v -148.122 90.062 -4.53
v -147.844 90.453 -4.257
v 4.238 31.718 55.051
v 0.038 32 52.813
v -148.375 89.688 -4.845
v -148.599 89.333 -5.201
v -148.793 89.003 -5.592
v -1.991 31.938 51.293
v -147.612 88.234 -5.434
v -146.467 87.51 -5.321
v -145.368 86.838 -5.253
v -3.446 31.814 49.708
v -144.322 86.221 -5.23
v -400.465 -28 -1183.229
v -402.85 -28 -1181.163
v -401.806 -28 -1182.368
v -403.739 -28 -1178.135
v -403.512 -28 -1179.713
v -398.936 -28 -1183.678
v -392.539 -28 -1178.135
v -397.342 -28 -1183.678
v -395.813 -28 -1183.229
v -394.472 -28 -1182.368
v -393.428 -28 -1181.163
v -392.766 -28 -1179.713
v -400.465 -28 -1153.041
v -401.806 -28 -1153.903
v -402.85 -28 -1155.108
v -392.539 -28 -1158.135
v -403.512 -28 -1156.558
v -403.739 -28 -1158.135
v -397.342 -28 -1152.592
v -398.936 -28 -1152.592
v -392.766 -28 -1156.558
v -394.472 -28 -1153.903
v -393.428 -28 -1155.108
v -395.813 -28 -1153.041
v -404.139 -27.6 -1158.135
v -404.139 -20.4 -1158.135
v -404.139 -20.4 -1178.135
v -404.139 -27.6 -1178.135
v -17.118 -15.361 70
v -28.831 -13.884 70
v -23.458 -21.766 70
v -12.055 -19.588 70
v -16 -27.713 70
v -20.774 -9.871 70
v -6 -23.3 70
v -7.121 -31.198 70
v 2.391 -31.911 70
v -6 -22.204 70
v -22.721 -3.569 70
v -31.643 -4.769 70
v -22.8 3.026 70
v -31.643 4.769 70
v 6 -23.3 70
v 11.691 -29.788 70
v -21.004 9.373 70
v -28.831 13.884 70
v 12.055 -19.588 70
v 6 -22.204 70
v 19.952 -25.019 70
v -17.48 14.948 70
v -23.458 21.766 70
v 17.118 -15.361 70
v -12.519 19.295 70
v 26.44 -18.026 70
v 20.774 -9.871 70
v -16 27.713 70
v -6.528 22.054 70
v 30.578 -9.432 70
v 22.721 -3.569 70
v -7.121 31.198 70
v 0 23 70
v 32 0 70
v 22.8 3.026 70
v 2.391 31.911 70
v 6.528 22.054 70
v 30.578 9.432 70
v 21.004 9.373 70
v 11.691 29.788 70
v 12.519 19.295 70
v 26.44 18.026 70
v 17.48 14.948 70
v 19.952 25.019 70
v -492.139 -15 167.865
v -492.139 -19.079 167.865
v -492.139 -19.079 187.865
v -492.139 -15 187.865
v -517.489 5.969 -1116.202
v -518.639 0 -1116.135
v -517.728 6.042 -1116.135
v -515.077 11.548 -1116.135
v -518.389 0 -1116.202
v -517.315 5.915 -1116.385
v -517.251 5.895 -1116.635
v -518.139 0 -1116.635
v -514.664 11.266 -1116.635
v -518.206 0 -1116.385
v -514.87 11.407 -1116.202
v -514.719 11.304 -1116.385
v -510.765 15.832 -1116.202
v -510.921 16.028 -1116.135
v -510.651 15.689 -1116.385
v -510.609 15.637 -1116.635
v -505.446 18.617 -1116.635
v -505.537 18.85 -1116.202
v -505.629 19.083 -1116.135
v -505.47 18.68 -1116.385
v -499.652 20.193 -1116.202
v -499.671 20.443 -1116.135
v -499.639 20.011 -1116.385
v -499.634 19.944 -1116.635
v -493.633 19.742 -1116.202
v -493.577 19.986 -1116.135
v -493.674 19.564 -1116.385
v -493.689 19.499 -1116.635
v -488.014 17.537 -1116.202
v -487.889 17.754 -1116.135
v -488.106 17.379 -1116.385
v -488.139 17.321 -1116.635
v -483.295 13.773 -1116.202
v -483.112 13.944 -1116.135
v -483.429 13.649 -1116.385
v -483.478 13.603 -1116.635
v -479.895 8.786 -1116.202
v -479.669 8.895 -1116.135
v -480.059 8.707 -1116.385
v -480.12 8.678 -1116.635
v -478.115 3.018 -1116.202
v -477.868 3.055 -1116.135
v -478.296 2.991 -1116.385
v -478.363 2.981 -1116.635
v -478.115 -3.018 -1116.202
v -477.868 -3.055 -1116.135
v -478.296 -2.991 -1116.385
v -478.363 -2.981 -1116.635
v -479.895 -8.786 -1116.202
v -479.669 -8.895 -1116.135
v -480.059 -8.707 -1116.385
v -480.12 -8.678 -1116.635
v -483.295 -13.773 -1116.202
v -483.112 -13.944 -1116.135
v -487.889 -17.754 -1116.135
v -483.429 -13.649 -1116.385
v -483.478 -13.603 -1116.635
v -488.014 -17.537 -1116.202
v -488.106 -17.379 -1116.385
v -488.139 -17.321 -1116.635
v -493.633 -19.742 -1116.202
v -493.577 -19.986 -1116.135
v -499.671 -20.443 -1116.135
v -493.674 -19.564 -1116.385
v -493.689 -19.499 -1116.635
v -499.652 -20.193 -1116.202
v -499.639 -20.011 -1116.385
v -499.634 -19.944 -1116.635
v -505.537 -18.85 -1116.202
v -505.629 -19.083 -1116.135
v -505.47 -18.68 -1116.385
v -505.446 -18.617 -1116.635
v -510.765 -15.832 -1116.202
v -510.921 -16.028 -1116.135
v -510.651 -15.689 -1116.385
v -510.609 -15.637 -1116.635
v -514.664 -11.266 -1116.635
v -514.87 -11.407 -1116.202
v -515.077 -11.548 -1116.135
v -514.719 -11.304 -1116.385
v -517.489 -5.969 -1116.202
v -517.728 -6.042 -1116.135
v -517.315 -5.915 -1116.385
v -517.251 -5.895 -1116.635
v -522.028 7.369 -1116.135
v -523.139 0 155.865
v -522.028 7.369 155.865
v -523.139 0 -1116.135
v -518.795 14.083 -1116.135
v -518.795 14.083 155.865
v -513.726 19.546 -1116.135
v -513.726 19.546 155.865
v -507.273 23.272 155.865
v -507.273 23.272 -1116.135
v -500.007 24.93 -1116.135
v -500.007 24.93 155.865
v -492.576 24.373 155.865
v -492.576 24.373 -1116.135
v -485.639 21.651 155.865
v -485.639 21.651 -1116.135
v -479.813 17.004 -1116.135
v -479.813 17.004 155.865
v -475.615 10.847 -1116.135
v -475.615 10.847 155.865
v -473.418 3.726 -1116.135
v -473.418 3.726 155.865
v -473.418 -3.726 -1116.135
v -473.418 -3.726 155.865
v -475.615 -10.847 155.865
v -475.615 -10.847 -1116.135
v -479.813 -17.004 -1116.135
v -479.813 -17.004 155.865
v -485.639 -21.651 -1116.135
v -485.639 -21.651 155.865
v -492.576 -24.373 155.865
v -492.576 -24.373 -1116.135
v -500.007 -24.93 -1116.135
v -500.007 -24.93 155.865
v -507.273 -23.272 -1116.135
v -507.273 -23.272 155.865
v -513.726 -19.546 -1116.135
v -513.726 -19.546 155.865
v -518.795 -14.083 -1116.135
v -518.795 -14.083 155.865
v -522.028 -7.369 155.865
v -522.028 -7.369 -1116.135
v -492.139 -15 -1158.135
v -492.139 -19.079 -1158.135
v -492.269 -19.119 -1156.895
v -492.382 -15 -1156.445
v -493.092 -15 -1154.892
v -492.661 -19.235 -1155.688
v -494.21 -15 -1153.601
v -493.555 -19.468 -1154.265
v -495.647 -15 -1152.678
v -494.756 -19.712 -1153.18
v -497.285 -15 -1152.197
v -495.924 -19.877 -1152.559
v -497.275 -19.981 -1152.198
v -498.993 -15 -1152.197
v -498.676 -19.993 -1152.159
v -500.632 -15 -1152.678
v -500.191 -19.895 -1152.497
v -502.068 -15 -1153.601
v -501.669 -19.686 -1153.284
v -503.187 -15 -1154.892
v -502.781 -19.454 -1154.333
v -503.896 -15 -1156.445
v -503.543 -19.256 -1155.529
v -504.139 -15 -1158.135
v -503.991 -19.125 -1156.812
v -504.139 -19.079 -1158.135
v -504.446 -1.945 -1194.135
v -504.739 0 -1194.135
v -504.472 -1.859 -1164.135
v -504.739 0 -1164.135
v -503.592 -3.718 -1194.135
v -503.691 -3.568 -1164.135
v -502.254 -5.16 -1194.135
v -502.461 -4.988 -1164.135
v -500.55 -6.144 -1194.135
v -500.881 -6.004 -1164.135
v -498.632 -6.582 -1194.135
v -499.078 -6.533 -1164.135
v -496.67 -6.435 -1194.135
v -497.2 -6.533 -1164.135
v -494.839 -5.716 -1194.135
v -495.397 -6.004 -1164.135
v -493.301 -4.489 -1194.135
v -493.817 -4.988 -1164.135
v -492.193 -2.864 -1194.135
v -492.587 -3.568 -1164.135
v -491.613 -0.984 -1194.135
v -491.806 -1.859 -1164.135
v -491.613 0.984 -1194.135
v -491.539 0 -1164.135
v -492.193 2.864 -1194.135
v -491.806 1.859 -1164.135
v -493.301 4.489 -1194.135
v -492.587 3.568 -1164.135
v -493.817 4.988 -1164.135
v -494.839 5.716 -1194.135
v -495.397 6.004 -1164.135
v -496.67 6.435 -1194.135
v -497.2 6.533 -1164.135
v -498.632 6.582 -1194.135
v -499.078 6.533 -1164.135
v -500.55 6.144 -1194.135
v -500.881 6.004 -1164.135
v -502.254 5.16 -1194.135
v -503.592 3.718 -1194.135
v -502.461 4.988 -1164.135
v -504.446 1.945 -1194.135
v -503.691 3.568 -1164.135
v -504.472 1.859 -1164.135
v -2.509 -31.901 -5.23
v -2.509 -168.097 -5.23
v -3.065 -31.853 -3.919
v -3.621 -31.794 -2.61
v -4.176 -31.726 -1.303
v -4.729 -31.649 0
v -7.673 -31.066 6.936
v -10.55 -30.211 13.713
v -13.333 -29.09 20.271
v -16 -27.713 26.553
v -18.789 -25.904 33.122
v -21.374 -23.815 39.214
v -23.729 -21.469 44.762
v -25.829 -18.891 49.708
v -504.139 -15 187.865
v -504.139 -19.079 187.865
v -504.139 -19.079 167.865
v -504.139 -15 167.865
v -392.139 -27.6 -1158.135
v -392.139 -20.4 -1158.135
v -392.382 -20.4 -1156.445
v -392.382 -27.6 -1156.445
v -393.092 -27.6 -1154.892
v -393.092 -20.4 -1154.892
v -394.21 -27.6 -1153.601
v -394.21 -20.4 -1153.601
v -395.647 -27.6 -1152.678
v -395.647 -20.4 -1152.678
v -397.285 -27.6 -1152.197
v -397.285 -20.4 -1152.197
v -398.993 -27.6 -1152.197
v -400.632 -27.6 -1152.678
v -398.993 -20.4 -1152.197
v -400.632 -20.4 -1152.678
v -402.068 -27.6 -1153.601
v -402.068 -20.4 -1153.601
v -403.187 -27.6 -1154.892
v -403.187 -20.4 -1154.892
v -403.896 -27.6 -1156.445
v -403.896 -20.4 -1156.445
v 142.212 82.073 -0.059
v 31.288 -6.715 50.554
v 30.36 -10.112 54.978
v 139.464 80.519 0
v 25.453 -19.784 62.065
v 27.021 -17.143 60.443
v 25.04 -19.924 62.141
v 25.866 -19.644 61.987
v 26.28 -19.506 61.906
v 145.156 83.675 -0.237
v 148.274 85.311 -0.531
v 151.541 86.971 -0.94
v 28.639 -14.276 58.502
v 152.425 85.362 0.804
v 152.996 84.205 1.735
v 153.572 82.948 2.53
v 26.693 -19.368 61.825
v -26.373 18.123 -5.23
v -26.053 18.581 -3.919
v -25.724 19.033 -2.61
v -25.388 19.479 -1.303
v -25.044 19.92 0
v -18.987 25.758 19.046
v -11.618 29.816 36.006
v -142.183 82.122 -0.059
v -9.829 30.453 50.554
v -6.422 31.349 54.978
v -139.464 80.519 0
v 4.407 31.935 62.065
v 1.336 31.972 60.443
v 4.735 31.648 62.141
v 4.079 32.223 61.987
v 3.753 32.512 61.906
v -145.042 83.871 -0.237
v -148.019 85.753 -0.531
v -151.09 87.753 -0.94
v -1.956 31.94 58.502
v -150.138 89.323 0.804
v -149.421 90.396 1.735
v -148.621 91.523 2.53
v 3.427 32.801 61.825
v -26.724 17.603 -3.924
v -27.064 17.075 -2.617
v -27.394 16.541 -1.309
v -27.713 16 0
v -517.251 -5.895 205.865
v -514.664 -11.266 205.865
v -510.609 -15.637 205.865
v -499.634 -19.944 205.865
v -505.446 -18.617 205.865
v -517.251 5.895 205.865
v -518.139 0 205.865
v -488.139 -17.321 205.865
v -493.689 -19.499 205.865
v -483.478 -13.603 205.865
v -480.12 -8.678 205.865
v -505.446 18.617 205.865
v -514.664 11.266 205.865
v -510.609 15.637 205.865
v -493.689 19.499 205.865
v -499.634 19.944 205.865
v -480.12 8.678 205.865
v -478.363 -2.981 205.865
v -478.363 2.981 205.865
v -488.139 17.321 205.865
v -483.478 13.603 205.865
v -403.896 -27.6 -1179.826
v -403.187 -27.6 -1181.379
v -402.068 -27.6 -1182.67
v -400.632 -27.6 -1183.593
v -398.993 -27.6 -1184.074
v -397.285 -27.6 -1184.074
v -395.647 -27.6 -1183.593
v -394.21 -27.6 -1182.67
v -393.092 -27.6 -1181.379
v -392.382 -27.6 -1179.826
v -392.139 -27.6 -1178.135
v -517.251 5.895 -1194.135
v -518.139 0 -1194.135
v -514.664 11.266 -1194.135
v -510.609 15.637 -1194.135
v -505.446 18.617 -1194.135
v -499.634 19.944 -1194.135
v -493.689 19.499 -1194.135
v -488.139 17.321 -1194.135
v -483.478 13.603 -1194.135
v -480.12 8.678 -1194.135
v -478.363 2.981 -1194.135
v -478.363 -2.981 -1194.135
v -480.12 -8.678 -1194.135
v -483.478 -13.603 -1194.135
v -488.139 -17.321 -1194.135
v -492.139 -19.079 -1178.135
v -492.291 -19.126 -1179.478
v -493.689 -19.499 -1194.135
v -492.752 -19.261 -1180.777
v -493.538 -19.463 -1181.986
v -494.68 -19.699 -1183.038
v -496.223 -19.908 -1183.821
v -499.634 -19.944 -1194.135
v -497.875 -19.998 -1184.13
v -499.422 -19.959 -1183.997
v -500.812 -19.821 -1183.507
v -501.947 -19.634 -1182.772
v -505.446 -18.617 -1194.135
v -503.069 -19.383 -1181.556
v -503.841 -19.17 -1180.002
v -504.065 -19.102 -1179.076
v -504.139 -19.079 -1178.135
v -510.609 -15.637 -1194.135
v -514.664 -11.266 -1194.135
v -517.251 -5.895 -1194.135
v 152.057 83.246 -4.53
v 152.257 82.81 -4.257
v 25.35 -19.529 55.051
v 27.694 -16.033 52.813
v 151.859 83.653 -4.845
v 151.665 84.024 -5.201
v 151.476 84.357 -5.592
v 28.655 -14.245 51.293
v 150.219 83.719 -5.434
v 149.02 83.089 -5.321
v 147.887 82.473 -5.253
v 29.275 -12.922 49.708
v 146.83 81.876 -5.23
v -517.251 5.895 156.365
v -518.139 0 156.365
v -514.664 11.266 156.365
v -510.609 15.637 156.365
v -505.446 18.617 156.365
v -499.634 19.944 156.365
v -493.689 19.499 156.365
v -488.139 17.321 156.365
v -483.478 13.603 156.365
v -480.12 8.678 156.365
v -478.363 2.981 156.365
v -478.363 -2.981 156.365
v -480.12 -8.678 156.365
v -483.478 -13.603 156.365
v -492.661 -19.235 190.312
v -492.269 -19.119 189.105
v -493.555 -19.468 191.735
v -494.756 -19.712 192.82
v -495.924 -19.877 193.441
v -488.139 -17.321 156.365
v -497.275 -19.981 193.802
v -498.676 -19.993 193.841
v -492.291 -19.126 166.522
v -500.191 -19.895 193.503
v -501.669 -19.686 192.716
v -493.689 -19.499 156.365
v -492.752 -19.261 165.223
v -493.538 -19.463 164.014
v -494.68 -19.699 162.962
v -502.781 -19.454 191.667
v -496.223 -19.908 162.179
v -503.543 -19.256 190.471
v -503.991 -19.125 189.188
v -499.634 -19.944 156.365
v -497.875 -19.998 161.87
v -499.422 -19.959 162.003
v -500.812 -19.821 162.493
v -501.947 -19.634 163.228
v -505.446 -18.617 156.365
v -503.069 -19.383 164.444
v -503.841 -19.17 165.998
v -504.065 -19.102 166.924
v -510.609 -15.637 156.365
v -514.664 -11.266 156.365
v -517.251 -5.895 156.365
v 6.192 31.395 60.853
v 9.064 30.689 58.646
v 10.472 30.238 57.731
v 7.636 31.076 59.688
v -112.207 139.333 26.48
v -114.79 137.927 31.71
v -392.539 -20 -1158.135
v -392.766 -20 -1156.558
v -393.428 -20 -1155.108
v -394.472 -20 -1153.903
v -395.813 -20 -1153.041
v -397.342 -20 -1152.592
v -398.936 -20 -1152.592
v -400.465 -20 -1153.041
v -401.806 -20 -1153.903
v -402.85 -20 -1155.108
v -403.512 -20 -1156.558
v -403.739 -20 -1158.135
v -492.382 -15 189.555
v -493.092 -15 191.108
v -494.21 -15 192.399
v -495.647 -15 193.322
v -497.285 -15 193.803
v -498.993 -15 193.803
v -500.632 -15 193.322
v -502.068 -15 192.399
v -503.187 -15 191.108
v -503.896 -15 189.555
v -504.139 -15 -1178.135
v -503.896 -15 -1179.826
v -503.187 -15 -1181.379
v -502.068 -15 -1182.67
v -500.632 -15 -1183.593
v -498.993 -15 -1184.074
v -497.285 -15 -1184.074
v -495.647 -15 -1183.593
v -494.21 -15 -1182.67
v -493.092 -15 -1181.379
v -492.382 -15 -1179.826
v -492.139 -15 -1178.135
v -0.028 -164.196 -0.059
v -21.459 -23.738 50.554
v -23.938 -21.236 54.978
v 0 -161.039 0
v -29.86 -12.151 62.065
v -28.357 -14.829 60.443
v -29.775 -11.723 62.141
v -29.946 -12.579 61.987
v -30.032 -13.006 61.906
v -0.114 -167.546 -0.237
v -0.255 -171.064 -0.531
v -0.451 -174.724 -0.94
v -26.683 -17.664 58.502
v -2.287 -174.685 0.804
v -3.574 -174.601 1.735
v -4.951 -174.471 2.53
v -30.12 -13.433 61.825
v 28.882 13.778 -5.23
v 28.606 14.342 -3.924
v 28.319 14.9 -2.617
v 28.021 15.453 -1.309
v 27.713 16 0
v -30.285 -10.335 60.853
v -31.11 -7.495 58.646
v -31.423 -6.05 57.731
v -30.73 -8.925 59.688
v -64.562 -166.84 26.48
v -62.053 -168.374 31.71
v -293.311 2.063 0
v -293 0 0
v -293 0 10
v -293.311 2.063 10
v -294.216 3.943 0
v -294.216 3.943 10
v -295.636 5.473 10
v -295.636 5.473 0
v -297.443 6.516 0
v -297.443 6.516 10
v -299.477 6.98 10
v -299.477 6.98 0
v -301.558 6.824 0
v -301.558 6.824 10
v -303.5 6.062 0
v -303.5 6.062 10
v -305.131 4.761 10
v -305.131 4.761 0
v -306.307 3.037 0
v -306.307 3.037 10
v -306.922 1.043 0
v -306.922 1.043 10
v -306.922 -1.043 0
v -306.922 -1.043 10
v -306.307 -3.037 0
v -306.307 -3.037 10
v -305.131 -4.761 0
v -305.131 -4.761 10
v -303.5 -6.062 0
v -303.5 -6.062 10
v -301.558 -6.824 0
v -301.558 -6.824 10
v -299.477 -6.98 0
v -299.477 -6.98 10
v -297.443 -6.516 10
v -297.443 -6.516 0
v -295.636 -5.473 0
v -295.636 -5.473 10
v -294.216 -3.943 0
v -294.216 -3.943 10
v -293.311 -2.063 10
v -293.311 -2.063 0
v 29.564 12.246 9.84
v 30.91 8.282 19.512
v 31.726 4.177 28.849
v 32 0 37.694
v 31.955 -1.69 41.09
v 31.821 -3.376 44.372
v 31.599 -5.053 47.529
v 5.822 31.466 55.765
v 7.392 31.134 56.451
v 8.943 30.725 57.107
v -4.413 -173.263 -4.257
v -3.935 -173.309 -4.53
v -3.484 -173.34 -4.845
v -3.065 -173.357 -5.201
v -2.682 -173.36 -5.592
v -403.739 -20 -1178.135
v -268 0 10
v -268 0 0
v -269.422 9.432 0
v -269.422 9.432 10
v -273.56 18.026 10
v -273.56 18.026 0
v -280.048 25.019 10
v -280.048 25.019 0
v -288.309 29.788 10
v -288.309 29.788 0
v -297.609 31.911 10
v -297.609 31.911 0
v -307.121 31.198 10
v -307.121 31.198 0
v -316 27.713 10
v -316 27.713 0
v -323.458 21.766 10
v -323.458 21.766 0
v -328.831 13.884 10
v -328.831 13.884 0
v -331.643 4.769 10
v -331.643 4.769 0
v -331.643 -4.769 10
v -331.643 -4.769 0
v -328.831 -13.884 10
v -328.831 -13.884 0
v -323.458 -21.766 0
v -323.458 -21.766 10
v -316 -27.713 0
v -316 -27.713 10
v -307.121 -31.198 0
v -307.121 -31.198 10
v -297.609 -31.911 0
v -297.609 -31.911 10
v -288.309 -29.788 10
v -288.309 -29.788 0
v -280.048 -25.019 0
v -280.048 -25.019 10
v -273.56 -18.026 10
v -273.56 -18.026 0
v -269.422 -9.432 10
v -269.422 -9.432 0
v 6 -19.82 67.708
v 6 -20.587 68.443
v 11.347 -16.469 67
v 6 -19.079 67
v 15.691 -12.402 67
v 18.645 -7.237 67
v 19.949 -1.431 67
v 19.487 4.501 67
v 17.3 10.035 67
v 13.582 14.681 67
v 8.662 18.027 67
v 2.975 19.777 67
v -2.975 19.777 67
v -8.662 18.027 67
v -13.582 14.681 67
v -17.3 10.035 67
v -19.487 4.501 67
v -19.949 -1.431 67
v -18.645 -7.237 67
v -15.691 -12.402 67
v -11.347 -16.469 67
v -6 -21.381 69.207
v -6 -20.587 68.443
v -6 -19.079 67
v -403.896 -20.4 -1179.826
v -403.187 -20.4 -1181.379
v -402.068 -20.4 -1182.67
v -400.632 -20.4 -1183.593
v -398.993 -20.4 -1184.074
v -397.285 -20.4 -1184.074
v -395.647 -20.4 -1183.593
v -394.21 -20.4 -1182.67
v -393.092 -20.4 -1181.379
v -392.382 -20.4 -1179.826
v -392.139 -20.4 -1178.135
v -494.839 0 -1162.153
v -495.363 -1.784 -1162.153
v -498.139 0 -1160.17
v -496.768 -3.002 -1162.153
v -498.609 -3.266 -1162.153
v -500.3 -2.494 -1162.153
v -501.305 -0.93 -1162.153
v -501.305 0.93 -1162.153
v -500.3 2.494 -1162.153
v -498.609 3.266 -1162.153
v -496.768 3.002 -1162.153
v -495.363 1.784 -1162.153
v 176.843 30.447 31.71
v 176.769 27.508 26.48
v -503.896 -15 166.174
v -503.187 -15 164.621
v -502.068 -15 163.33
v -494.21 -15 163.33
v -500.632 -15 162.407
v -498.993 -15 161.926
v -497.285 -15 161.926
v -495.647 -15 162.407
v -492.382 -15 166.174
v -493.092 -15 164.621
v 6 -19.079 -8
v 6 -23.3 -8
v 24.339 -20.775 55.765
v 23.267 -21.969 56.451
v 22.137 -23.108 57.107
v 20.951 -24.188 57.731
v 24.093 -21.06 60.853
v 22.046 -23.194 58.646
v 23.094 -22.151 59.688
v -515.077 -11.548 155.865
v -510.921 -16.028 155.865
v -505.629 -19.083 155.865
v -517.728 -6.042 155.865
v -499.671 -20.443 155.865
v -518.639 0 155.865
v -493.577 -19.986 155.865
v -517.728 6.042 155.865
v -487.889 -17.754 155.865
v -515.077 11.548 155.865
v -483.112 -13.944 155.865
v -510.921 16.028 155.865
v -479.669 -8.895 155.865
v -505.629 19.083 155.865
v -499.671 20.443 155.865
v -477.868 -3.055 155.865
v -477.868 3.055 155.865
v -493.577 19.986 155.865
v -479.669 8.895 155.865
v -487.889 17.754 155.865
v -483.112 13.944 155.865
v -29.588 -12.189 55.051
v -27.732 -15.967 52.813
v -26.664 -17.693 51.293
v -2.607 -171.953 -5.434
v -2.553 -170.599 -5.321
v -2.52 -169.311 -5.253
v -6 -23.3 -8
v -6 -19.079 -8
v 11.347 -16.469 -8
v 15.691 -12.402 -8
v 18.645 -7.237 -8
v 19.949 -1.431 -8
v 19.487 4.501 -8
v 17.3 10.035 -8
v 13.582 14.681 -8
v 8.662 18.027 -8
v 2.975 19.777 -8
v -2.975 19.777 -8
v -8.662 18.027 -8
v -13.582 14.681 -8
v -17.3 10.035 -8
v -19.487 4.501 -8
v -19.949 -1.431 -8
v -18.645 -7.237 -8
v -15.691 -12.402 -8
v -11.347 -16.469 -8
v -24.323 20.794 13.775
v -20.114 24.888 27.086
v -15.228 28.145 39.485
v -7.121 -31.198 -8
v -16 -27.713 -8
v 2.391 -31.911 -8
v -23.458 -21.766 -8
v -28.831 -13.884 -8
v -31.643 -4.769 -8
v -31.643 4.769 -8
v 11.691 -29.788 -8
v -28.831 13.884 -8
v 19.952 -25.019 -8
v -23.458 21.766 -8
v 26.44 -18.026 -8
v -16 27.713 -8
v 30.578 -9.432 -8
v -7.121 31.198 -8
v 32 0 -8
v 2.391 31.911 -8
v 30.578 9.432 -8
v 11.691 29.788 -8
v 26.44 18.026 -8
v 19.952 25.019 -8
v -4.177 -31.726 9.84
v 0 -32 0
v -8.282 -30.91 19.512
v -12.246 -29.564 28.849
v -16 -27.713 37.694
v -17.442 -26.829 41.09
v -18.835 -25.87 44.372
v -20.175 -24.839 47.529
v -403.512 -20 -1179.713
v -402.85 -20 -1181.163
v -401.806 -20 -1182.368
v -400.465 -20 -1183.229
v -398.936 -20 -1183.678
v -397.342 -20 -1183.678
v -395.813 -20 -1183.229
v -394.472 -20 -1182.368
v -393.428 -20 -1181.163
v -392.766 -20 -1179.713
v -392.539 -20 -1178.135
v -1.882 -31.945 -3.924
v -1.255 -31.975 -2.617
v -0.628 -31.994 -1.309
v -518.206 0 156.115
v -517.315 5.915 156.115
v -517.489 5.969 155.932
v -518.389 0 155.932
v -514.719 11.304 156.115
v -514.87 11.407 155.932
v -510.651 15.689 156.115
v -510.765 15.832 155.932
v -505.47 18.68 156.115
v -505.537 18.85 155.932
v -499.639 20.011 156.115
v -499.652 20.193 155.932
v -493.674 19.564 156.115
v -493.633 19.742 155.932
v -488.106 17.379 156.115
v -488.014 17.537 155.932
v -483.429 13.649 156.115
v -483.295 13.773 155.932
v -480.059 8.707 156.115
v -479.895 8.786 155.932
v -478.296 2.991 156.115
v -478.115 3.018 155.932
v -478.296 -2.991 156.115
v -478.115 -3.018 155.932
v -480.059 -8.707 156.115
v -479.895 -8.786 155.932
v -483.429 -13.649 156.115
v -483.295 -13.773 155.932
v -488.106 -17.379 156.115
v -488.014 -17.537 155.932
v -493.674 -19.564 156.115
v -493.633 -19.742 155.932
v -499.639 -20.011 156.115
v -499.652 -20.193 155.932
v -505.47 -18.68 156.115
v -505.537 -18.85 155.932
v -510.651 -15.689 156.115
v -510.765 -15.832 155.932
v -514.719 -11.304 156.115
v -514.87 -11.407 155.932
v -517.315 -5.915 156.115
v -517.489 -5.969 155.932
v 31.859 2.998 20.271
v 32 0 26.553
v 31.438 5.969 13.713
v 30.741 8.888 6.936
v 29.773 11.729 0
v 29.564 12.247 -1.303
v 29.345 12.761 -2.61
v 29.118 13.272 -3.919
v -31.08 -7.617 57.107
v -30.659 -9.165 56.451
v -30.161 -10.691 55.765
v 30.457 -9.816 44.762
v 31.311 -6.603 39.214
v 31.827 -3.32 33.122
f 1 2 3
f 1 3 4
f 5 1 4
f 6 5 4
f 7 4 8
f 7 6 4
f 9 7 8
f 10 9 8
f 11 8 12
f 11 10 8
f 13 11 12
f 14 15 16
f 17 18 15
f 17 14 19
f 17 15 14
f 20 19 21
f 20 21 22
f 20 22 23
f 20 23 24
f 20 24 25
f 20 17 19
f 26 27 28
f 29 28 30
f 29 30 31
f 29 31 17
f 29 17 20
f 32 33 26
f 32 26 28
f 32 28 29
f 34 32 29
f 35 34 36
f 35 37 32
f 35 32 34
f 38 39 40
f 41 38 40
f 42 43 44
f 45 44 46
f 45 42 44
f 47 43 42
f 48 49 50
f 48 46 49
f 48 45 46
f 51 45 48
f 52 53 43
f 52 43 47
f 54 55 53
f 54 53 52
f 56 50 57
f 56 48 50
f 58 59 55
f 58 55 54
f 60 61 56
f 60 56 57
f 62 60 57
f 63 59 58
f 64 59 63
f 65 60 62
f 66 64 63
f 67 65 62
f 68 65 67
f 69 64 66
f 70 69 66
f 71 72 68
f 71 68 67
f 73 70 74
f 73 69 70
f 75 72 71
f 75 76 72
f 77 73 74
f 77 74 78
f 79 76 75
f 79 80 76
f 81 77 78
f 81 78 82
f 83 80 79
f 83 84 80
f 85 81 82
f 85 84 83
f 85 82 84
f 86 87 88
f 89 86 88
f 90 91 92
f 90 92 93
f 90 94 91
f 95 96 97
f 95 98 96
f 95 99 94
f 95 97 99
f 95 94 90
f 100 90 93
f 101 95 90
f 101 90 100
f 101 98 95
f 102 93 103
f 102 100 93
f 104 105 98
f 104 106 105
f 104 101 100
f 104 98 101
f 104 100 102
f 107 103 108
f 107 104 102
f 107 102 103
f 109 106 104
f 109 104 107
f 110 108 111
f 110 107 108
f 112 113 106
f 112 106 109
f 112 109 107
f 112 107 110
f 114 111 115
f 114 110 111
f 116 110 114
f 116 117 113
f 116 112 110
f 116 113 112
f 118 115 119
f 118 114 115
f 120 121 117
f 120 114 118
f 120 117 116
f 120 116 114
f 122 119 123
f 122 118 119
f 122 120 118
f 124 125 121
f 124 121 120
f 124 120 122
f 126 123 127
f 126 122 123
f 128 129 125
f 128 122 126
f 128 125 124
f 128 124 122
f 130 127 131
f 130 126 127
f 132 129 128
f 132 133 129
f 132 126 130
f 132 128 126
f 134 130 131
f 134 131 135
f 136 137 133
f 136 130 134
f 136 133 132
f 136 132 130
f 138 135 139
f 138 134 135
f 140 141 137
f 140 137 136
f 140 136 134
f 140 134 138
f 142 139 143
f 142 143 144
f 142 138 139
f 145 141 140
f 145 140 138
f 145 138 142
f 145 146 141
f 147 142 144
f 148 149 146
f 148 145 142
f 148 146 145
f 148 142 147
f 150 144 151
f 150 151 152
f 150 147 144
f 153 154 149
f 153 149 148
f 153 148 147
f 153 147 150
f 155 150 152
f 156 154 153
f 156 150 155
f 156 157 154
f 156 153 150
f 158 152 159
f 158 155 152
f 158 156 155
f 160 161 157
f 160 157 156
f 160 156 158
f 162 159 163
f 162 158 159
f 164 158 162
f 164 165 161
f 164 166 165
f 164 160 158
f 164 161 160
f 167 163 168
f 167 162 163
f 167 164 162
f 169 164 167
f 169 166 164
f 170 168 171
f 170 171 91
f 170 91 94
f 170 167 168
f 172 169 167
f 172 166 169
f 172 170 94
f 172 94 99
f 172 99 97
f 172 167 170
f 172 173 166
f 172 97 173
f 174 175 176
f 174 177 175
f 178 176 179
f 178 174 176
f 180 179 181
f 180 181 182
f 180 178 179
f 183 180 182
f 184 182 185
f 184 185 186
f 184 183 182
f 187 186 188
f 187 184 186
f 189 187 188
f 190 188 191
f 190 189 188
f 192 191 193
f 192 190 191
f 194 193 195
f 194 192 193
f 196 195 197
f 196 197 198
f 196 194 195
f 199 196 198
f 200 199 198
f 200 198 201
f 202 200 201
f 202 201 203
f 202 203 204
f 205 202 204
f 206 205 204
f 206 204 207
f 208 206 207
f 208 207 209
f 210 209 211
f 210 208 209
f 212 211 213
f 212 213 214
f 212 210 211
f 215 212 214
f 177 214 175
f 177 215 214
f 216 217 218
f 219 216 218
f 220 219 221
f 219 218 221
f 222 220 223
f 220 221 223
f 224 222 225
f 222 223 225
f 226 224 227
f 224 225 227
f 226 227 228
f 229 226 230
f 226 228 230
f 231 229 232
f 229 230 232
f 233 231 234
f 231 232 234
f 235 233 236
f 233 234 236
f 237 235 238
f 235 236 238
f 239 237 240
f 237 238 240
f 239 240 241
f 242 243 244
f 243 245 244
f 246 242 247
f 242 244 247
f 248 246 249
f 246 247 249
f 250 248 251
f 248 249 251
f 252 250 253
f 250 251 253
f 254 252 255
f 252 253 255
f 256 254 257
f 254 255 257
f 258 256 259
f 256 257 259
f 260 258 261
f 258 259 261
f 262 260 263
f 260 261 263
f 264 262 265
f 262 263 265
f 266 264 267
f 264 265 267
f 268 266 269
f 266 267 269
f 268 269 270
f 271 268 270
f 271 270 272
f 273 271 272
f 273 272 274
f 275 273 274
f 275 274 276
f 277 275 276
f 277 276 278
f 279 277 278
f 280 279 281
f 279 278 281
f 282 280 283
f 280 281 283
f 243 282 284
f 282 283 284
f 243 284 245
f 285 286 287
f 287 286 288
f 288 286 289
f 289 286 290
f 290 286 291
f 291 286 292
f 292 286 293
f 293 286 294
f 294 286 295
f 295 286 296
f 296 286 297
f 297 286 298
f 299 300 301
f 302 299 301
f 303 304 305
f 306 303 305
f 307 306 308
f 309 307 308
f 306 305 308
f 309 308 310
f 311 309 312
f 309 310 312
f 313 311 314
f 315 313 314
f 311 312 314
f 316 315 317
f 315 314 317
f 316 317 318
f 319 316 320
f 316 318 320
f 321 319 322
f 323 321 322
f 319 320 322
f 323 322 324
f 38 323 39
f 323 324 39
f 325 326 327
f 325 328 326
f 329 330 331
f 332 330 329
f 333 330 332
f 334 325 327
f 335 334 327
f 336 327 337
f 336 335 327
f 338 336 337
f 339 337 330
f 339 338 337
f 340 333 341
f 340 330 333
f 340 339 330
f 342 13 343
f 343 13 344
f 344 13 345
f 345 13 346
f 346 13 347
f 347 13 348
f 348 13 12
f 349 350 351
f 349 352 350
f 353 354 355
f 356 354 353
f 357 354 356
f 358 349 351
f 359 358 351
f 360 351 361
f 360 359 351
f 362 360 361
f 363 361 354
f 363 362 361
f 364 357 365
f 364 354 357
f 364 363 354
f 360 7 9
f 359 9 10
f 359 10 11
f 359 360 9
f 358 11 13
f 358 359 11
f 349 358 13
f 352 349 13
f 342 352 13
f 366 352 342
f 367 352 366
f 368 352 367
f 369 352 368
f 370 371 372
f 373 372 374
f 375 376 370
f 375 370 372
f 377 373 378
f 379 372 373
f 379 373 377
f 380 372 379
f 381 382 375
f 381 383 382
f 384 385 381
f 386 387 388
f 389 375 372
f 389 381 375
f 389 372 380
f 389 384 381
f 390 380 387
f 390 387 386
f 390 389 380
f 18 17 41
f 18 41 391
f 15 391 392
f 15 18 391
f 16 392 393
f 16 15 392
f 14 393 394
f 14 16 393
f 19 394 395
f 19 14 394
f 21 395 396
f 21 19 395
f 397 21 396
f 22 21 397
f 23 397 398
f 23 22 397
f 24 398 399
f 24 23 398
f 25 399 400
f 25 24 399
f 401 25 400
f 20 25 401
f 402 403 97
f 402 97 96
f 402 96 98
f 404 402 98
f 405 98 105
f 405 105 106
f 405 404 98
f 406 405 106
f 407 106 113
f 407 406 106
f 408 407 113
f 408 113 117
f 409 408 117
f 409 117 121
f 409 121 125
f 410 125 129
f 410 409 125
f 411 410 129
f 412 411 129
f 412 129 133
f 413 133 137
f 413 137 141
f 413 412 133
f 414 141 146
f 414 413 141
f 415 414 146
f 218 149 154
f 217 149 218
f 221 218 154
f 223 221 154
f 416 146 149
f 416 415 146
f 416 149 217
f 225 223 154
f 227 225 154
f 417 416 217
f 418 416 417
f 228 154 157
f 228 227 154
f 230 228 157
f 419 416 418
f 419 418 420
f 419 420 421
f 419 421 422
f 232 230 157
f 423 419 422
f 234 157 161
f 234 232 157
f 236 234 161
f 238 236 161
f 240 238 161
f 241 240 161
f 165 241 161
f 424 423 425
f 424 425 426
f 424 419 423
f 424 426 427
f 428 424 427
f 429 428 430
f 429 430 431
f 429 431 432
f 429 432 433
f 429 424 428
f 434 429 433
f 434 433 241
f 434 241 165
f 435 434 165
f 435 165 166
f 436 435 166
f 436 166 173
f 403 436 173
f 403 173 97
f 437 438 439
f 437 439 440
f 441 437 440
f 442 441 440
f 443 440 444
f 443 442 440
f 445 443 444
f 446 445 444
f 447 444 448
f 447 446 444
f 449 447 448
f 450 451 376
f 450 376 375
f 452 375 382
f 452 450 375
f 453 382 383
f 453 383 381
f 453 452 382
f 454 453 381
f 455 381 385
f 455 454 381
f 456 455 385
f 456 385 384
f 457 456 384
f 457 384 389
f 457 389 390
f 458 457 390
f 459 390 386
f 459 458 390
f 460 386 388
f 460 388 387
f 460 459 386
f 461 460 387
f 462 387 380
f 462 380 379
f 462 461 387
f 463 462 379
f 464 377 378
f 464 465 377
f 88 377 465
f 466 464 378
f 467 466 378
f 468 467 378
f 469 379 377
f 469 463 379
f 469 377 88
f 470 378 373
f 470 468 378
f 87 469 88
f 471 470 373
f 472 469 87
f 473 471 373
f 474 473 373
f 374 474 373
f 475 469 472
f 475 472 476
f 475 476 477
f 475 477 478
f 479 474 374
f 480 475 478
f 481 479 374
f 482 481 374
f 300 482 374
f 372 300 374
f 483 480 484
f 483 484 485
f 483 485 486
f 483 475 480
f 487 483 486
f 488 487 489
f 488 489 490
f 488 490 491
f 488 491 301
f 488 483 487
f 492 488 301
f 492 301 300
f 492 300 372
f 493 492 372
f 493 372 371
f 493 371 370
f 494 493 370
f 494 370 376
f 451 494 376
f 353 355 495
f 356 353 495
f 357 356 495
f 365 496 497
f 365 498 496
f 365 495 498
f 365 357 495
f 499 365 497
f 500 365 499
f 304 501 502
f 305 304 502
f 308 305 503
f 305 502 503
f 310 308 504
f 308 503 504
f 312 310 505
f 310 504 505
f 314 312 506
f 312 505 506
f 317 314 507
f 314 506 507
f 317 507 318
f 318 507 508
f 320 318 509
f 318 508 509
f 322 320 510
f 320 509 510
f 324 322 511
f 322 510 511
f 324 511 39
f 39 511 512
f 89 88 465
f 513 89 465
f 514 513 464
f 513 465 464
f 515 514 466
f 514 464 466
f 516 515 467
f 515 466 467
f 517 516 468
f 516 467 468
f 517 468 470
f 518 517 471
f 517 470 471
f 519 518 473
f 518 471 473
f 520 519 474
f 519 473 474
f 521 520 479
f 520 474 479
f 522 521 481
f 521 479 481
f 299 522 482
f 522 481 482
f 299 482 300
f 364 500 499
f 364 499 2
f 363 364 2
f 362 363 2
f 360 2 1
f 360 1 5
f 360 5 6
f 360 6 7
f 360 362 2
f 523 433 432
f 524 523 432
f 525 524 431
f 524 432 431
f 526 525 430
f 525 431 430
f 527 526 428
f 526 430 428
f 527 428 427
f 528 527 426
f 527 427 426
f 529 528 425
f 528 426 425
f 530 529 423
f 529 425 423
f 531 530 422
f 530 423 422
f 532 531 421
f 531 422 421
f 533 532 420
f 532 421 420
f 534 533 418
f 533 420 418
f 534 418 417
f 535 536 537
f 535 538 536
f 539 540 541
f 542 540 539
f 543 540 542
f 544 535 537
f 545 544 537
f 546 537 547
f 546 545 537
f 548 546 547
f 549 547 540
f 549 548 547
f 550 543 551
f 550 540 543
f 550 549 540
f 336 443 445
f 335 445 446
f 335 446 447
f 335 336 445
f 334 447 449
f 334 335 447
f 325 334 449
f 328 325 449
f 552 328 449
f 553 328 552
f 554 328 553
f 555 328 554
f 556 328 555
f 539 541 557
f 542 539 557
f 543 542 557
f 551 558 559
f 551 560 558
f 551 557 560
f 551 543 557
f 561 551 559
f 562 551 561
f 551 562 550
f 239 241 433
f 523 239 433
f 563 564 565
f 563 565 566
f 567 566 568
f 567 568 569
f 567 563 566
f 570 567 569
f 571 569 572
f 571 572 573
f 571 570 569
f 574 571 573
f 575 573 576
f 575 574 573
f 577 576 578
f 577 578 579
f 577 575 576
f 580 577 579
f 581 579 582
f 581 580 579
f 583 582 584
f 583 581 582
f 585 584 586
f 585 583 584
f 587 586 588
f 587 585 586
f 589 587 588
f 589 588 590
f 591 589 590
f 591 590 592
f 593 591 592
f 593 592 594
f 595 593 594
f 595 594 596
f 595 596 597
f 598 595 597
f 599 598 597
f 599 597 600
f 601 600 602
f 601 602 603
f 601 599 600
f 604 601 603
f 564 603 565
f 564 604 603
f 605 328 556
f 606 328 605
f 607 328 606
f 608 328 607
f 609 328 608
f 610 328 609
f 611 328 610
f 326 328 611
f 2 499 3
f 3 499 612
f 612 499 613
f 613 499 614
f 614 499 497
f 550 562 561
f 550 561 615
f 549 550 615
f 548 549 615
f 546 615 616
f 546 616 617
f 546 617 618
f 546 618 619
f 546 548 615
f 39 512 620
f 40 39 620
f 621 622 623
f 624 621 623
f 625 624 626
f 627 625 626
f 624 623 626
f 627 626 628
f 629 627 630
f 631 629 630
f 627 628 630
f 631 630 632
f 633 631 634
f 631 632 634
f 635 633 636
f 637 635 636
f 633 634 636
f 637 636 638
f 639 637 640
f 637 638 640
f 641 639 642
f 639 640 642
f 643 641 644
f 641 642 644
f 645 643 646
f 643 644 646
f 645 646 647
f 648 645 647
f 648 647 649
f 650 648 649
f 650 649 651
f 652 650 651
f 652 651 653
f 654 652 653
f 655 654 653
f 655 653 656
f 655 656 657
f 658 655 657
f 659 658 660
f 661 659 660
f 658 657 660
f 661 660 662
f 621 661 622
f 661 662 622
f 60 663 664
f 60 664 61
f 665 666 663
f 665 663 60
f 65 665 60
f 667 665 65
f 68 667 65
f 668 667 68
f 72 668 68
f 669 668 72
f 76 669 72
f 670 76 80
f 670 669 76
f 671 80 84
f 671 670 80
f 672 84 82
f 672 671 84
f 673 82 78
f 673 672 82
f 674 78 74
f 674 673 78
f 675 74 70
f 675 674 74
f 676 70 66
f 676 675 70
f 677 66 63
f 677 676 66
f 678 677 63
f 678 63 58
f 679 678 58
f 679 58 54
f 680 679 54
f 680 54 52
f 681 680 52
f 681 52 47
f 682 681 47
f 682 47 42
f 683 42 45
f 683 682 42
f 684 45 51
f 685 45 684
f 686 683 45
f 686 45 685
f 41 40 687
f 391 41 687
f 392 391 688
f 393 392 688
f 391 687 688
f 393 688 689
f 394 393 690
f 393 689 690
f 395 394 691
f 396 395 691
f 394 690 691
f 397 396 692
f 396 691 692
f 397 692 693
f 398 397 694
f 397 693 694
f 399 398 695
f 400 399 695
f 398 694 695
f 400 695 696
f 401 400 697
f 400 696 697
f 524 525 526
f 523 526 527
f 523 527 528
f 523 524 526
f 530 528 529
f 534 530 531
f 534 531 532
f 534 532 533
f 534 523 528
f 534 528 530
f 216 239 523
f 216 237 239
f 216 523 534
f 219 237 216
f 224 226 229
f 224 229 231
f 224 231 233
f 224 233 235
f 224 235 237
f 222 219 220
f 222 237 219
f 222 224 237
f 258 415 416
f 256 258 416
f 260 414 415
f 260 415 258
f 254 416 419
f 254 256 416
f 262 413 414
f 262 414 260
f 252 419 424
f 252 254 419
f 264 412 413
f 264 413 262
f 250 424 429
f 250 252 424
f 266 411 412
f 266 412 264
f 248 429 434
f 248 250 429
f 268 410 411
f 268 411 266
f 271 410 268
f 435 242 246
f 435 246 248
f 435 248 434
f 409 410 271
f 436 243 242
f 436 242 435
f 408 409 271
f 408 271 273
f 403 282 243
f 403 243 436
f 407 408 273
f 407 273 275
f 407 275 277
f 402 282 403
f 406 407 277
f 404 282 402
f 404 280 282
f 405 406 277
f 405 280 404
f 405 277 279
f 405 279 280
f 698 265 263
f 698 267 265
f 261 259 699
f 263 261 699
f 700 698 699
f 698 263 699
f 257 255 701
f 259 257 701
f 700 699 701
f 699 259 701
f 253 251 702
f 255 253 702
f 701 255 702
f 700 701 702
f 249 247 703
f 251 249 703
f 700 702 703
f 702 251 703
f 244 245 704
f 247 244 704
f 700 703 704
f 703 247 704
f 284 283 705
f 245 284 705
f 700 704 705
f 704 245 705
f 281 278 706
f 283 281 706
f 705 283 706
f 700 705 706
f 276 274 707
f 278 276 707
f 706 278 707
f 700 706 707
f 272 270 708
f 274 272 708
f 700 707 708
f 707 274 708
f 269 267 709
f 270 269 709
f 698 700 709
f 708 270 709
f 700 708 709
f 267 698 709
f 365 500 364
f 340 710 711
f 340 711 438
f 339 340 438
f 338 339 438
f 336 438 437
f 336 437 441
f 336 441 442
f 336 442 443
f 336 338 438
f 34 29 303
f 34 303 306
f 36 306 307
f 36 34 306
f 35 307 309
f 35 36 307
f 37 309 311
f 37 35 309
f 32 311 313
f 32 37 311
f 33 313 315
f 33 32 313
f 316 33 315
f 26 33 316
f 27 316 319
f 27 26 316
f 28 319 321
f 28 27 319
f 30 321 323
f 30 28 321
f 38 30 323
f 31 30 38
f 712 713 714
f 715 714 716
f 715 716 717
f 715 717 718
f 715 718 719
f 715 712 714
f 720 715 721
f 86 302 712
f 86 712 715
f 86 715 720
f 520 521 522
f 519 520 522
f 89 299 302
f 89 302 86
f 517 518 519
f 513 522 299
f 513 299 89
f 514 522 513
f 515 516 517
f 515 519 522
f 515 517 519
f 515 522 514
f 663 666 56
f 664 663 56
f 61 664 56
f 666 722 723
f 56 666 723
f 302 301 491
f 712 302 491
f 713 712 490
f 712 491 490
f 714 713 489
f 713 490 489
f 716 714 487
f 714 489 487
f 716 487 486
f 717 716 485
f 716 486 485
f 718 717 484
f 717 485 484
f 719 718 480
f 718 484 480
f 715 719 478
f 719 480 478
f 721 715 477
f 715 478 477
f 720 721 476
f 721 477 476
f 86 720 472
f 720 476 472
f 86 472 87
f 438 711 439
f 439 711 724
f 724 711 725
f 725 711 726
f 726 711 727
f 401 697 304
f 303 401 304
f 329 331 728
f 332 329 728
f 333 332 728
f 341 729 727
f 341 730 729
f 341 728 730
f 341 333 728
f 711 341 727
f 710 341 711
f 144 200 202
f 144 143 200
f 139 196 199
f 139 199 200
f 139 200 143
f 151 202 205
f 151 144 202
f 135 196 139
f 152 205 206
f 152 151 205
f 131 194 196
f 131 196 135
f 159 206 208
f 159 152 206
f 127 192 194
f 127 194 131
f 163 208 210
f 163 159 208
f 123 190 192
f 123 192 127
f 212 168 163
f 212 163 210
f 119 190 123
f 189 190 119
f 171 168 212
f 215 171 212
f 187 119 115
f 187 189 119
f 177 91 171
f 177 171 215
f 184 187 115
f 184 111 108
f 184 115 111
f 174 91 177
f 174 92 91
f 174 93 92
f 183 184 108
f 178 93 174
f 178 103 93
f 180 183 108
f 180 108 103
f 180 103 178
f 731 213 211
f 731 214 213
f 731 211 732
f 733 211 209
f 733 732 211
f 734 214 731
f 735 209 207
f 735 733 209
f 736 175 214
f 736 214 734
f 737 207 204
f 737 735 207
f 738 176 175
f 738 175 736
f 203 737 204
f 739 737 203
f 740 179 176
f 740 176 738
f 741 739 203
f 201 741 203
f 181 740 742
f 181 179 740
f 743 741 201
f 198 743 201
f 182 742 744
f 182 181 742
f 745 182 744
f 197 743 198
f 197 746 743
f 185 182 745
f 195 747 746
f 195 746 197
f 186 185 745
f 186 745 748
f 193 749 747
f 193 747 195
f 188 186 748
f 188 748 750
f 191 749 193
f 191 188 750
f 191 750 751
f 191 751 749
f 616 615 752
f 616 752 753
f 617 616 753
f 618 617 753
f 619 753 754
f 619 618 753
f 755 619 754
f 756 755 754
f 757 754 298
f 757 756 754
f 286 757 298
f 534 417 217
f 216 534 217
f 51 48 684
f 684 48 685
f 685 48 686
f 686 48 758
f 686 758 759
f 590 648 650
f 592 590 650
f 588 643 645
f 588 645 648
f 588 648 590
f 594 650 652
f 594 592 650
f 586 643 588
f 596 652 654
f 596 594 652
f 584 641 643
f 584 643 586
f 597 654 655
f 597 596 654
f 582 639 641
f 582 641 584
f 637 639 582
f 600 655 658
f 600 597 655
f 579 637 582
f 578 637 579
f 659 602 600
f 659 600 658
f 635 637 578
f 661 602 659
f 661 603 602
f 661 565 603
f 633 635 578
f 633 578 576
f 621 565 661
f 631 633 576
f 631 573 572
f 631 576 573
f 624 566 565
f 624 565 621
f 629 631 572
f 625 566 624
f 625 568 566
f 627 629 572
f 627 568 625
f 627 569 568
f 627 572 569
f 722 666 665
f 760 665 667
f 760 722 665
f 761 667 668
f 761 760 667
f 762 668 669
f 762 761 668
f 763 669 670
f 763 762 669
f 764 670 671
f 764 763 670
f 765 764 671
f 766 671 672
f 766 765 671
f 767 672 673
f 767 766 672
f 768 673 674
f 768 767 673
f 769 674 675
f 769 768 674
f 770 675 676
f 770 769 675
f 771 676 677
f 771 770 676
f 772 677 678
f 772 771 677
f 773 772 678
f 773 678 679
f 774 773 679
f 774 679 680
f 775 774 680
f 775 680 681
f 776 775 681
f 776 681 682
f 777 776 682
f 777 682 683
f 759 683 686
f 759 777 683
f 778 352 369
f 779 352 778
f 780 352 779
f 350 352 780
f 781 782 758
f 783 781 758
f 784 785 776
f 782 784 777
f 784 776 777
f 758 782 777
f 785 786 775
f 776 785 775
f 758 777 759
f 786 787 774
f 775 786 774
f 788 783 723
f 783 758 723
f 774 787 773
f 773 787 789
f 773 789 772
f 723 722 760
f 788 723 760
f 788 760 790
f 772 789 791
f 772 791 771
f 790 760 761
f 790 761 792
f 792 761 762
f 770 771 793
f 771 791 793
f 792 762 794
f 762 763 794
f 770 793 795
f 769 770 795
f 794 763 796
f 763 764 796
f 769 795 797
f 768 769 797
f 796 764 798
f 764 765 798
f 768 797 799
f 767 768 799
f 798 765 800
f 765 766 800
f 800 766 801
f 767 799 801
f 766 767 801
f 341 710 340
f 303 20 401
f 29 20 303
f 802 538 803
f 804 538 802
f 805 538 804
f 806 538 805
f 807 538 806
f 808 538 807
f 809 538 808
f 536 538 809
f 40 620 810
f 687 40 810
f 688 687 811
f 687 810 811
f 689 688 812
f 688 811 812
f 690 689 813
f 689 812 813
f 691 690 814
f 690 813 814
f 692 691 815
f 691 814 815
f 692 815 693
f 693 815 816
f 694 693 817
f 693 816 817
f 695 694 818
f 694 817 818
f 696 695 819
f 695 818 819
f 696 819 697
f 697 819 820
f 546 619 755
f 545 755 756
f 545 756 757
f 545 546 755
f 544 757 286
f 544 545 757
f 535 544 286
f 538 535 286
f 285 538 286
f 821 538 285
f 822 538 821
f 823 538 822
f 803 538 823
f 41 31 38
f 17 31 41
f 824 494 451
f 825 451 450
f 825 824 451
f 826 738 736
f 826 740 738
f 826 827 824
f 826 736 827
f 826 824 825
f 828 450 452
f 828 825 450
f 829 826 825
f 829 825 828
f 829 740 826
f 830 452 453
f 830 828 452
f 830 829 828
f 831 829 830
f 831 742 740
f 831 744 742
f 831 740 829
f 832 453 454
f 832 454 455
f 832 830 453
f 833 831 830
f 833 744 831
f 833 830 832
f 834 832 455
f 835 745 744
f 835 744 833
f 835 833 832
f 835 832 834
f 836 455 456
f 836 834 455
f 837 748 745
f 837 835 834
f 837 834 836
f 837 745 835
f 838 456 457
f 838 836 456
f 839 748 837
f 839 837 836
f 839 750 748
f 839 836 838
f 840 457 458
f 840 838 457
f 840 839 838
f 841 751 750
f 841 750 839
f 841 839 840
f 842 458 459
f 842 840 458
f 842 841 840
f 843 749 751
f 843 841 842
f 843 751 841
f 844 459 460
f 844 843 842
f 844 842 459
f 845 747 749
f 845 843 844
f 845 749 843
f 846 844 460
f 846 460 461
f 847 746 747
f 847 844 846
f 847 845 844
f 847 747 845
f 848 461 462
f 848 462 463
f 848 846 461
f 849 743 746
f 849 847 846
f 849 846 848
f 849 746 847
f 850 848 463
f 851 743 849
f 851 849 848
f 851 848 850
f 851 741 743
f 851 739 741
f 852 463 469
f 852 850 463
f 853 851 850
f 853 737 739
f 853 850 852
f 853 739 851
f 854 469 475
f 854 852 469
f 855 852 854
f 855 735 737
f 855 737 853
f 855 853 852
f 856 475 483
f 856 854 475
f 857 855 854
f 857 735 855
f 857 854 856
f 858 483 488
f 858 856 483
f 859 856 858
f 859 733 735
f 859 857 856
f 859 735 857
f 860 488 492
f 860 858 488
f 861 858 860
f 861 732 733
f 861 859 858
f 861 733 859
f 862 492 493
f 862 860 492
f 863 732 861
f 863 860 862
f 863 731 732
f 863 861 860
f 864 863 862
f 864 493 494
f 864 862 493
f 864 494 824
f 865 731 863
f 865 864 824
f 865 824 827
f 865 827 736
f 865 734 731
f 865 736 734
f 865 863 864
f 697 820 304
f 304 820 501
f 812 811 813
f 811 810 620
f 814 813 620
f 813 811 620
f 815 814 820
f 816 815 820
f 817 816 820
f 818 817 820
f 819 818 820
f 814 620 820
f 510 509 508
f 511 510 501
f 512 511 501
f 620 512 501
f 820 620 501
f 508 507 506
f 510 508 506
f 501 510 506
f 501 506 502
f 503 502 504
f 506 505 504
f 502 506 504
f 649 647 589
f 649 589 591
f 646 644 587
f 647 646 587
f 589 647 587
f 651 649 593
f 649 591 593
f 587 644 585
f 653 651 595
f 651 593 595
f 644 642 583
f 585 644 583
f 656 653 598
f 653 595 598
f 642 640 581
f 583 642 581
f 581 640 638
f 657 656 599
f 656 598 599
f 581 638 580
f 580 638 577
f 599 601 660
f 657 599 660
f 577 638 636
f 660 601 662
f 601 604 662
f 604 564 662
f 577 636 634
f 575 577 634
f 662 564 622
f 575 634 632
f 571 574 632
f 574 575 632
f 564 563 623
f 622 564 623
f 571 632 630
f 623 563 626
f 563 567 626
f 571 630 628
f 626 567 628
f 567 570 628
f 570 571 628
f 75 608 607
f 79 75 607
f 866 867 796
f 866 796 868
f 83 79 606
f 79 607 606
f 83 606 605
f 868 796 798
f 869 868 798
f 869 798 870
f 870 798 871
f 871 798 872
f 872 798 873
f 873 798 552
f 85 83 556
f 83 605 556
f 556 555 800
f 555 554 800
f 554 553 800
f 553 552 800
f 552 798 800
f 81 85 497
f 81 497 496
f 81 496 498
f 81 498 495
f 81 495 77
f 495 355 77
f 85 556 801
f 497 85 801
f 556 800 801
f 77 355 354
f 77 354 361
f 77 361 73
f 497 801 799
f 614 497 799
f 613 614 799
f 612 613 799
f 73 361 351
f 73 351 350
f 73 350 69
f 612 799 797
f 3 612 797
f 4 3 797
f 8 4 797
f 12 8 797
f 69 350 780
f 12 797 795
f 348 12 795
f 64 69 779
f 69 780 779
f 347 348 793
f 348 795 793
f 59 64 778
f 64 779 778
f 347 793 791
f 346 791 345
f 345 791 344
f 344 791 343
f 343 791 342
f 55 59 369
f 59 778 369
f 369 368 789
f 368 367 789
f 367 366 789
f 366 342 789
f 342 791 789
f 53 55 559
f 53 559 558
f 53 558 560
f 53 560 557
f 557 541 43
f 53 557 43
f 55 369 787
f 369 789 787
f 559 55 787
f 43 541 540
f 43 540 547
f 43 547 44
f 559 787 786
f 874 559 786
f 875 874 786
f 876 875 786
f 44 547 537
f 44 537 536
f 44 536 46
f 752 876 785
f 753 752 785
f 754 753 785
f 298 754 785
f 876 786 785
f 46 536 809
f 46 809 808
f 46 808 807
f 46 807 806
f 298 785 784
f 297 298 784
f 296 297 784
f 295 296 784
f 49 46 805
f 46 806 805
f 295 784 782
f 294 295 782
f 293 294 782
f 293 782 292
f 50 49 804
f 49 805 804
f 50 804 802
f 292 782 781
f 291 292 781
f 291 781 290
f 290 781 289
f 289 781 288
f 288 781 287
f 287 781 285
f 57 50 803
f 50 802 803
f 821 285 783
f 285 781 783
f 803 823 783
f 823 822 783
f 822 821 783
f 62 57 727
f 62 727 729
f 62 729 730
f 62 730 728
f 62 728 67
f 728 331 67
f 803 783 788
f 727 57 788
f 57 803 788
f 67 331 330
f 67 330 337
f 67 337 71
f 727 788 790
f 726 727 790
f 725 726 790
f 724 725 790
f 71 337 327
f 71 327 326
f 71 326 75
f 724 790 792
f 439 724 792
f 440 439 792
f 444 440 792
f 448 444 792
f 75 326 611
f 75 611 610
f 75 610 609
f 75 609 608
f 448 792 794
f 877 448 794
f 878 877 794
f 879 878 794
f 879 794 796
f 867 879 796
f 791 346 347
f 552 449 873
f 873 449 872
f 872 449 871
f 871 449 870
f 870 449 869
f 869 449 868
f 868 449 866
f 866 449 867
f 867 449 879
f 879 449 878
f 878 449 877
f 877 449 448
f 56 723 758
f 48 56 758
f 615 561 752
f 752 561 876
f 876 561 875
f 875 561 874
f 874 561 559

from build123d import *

# Parameters (mm, degrees)
F12_DEPTH      = 6
F13_R          = 32
F14_DEPTH      = 100
F15_R          = 32
F15_R_2        = 20
F16_DEPTH      = 70
F16_DEPTH_BACK = 8
F17_SIZE       = 3
F19_R          = 5
F20_R          = 13
F21_COUNT      = 3
F26_DEPTH      = 5
F29_DEPTH      = 213.865565134
F31_DEPTH      = 8
F32_SIZE       = 0.4
F33_R          = 32
F33_R_2        = 7
F34_DEPTH      = 10
F35_D          = 13.2
F35_DEPTH      = 30
F35_TIP        = 3.9656800856
F36_DEPTH      = 5


with BuildPart() as f12:
    # F11 (on line) + F9 (on line) → F12 (new body)
    with BuildSketch(Plane(origin=(18.7036752691, -11.4330577599, 38.9902914797), x_dir=(0.9083803729, 0.1176579191, -0.4012501866), z_dir=(0.4181448291, -0.2556007798, 0.8716783485))):
        Polygon((-20.5901358366, -167.9293339421), (-50.6999662671, 18.1308662927), (-88.9019056321, -152.6485581961), align=None)
    with BuildSketch(Plane(origin=(0, 0, 0), x_dir=(0, 1, 0), z_dir=(0.9205048535, 0, 0.3907311285))):
        Polygon((-175, 0), (0, 0), (0, 70), align=None)
    extrude(amount=-F12_DEPTH, dir=(0.4181448291, -0.2556007798, 0.8716783485))

    # F13 (on Top) → F14 (cut, symmetric)
    with BuildSketch(Plane.XY):
        Circle(F13_R)
    extrude(amount=F14_DEPTH, both=True, mode=Mode.SUBTRACT)

    # F15 (on Top) → F16 (join, two sides)
    with BuildSketch(Plane.XY) as f16_sk:
        Circle(F15_R)
        Circle(F15_R_2, mode=Mode.SUBTRACT)
    extrude(amount=F16_DEPTH)
    extrude(f16_sk.sketch, amount=-F16_DEPTH_BACK)

    # F17
    f17_edges = [f12.edges().sort_by_distance(p)[0] for p in [
        (-20, 0, 70),
    ]]
    chamfer(f17_edges, length=F17_SIZE)

    # F18: union 

    # F19
    f19_edges = [f12.edges().sort_by_distance(p)[0] for p in [
        (-14.71205, -95.387247, 23.518824),
    ]]
    fillet(f19_edges, radius=F19_R)

    # F20
    f20_edges = [f12.edges().sort_by_distance(p)[0] for p in [
        (-12.026201, -98.053222, 28.331953),
    ]]
    fillet(f20_edges, radius=F20_R)

    # F21: F12 ×3 about axis
    f21_axis = Axis((0, 0, -8), (0, 0, 1))


with BuildPart() as f12_1:
    add(f12.part)
    for i in range(1, F21_COUNT):
        add(f12.part.rotate(f21_axis, i * 360 / F21_COUNT))

    # F28 (on face) → F29 (cut, through all)
    with BuildSketch(Plane(origin=(0, 0, -8), x_dir=(1, 0, 0), z_dir=(0, 0, -1))):
        with BuildLine():
            Line((-6, 23.3), (-6, 19.0787840283))
            ThreePointArc((-6, 19.0787840283), (0, 20), (6, 19.0787840283))
            Line((6, 19.0787840283), (6, 23.3))
            Line((6, 23.3), (-6, 23.3))
        make_face()
    extrude(amount=-F29_DEPTH, mode=Mode.SUBTRACT)


with BuildPart() as f23:
    # F22 (on Front) → F23 (revolve)
    with BuildSketch(Plane.XZ):
        with BuildLine():
            Line((-498.1391332102, -1194.135434866), (-498.1391332102, 205.864565134))
            Line((-498.1391332102, 205.864565134), (-518.1391332102, 205.864565134))
            Line((-518.1391332102, 205.864565134), (-518.1391332102, 156.364565134))
            ThreePointArc((-518.1391332102, 156.364565134), (-518.2855798196, 156.0110117435), (-518.6391332102, 155.864565134))
            Line((-518.6391332102, 155.864565134), (-523.1391332102, 155.864565134))
            Line((-523.1391332102, 155.864565134), (-523.1391332102, -1116.135434866))
            Line((-523.1391332102, -1116.135434866), (-518.6391332102, -1116.135434866))
            ThreePointArc((-518.6391332102, -1116.135434866), (-518.2855798196, -1116.2818814754), (-518.1391332102, -1116.635434866))
            Line((-518.1391332102, -1116.635434866), (-518.1391332102, -1194.135434866))
            Line((-518.1391332102, -1194.135434866), (-498.1391332102, -1194.135434866))
        make_face()
    revolve(axis=Axis((-498.1391332102, 0, -494.135434866), (0, 0, -1)))

    # F25 (on offset) → F26 (cut)
    with BuildSketch(Plane.XZ.offset(20)):
        with BuildLine():
            Line((-504.1391332102, -1158.135434866), (-504.1391332102, -1178.135434866))
            ThreePointArc((-504.1391332102, -1178.135434866), (-498.1391332102, -1184.135434866), (-492.1391332102, -1178.135434866))
            Line((-492.1391332102, -1178.135434866), (-492.1391332102, -1158.135434866))
            ThreePointArc((-492.1391332102, -1158.135434866), (-498.1391332102, -1152.135434866), (-504.1391332102, -1158.135434866))
        make_face()
    extrude(amount=-F26_DEPTH, mode=Mode.SUBTRACT)

    # F35
    with Locations(Plane(origin=(0, 0, -1194.135434866), x_dir=(1, 0, 0), z_dir=(0, 0, -1))):
        with Locations((-498.1391332102, 0)):
            Hole(F35_D / 2, depth=F35_DEPTH)
            with Locations((0, 0, -(F35_DEPTH + F35_TIP / 2))):  # 118° drill point
                Cone(0, F35_D / 2, F35_TIP, mode=Mode.SUBTRACT)

    # F25 (on offset) → F36 (cut)
    with BuildSketch(Plane.XZ.offset(20)):
        with BuildLine():
            Line((-504.1391332102, 187.864565134), (-504.1391332102, 167.864565134))
            ThreePointArc((-504.1391332102, 167.864565134), (-498.1391332102, 161.864565134), (-492.1391332102, 167.864565134))
            Line((-492.1391332102, 167.864565134), (-492.1391332102, 187.864565134))
            ThreePointArc((-492.1391332102, 187.864565134), (-498.1391332102, 193.864565134), (-504.1391332102, 187.864565134))
        make_face()
    extrude(amount=-F36_DEPTH, mode=Mode.SUBTRACT)


with BuildPart() as f31:
    # F30 (on offset) → F31 (new body)
    with BuildSketch(Plane.XZ.offset(20)):
        with BuildLine():
            Line((-392.1391332102, -1178.135434866), (-392.1391332102, -1158.135434866))
            ThreePointArc((-392.1391332102, -1158.135434866), (-398.1391332102, -1152.135434866), (-404.1391332102, -1158.135434866))
            Line((-404.1391332102, -1158.135434866), (-404.1391332102, -1178.135434866))
            ThreePointArc((-404.1391332102, -1178.135434866), (-398.1391332102, -1184.135434866), (-392.1391332102, -1178.135434866))
        make_face()
    extrude(amount=F31_DEPTH)

    # F32
    f32_edges = [f31.edges().sort_by_distance(p)[0] for p in [
        (-392.139133, -28, -1168.135435),
        (-398.139133, -28, -1152.135435),
        (-404.139133, -28, -1168.135435),
        (-398.139133, -28, -1184.135435),
        (-392.139133, -20, -1168.135435),
        (-398.139133, -20, -1152.135435),
        (-404.139133, -20, -1168.135435),
        (-398.139133, -20, -1184.135435),
    ]]
    chamfer(f32_edges, length=F32_SIZE)


with BuildPart() as f34:
    # F33 (on Top) → F34 (new body)
    with BuildSketch(Plane.XY):
        with Locations((-300, 0)):
            Circle(F33_R)
        with Locations((-300, 0)):
            Circle(F33_R_2, mode=Mode.SUBTRACT)
    extrude(amount=F34_DEPTH)


solid = Compound([f12_1.part, f23.part, f31.part, f34.part])
